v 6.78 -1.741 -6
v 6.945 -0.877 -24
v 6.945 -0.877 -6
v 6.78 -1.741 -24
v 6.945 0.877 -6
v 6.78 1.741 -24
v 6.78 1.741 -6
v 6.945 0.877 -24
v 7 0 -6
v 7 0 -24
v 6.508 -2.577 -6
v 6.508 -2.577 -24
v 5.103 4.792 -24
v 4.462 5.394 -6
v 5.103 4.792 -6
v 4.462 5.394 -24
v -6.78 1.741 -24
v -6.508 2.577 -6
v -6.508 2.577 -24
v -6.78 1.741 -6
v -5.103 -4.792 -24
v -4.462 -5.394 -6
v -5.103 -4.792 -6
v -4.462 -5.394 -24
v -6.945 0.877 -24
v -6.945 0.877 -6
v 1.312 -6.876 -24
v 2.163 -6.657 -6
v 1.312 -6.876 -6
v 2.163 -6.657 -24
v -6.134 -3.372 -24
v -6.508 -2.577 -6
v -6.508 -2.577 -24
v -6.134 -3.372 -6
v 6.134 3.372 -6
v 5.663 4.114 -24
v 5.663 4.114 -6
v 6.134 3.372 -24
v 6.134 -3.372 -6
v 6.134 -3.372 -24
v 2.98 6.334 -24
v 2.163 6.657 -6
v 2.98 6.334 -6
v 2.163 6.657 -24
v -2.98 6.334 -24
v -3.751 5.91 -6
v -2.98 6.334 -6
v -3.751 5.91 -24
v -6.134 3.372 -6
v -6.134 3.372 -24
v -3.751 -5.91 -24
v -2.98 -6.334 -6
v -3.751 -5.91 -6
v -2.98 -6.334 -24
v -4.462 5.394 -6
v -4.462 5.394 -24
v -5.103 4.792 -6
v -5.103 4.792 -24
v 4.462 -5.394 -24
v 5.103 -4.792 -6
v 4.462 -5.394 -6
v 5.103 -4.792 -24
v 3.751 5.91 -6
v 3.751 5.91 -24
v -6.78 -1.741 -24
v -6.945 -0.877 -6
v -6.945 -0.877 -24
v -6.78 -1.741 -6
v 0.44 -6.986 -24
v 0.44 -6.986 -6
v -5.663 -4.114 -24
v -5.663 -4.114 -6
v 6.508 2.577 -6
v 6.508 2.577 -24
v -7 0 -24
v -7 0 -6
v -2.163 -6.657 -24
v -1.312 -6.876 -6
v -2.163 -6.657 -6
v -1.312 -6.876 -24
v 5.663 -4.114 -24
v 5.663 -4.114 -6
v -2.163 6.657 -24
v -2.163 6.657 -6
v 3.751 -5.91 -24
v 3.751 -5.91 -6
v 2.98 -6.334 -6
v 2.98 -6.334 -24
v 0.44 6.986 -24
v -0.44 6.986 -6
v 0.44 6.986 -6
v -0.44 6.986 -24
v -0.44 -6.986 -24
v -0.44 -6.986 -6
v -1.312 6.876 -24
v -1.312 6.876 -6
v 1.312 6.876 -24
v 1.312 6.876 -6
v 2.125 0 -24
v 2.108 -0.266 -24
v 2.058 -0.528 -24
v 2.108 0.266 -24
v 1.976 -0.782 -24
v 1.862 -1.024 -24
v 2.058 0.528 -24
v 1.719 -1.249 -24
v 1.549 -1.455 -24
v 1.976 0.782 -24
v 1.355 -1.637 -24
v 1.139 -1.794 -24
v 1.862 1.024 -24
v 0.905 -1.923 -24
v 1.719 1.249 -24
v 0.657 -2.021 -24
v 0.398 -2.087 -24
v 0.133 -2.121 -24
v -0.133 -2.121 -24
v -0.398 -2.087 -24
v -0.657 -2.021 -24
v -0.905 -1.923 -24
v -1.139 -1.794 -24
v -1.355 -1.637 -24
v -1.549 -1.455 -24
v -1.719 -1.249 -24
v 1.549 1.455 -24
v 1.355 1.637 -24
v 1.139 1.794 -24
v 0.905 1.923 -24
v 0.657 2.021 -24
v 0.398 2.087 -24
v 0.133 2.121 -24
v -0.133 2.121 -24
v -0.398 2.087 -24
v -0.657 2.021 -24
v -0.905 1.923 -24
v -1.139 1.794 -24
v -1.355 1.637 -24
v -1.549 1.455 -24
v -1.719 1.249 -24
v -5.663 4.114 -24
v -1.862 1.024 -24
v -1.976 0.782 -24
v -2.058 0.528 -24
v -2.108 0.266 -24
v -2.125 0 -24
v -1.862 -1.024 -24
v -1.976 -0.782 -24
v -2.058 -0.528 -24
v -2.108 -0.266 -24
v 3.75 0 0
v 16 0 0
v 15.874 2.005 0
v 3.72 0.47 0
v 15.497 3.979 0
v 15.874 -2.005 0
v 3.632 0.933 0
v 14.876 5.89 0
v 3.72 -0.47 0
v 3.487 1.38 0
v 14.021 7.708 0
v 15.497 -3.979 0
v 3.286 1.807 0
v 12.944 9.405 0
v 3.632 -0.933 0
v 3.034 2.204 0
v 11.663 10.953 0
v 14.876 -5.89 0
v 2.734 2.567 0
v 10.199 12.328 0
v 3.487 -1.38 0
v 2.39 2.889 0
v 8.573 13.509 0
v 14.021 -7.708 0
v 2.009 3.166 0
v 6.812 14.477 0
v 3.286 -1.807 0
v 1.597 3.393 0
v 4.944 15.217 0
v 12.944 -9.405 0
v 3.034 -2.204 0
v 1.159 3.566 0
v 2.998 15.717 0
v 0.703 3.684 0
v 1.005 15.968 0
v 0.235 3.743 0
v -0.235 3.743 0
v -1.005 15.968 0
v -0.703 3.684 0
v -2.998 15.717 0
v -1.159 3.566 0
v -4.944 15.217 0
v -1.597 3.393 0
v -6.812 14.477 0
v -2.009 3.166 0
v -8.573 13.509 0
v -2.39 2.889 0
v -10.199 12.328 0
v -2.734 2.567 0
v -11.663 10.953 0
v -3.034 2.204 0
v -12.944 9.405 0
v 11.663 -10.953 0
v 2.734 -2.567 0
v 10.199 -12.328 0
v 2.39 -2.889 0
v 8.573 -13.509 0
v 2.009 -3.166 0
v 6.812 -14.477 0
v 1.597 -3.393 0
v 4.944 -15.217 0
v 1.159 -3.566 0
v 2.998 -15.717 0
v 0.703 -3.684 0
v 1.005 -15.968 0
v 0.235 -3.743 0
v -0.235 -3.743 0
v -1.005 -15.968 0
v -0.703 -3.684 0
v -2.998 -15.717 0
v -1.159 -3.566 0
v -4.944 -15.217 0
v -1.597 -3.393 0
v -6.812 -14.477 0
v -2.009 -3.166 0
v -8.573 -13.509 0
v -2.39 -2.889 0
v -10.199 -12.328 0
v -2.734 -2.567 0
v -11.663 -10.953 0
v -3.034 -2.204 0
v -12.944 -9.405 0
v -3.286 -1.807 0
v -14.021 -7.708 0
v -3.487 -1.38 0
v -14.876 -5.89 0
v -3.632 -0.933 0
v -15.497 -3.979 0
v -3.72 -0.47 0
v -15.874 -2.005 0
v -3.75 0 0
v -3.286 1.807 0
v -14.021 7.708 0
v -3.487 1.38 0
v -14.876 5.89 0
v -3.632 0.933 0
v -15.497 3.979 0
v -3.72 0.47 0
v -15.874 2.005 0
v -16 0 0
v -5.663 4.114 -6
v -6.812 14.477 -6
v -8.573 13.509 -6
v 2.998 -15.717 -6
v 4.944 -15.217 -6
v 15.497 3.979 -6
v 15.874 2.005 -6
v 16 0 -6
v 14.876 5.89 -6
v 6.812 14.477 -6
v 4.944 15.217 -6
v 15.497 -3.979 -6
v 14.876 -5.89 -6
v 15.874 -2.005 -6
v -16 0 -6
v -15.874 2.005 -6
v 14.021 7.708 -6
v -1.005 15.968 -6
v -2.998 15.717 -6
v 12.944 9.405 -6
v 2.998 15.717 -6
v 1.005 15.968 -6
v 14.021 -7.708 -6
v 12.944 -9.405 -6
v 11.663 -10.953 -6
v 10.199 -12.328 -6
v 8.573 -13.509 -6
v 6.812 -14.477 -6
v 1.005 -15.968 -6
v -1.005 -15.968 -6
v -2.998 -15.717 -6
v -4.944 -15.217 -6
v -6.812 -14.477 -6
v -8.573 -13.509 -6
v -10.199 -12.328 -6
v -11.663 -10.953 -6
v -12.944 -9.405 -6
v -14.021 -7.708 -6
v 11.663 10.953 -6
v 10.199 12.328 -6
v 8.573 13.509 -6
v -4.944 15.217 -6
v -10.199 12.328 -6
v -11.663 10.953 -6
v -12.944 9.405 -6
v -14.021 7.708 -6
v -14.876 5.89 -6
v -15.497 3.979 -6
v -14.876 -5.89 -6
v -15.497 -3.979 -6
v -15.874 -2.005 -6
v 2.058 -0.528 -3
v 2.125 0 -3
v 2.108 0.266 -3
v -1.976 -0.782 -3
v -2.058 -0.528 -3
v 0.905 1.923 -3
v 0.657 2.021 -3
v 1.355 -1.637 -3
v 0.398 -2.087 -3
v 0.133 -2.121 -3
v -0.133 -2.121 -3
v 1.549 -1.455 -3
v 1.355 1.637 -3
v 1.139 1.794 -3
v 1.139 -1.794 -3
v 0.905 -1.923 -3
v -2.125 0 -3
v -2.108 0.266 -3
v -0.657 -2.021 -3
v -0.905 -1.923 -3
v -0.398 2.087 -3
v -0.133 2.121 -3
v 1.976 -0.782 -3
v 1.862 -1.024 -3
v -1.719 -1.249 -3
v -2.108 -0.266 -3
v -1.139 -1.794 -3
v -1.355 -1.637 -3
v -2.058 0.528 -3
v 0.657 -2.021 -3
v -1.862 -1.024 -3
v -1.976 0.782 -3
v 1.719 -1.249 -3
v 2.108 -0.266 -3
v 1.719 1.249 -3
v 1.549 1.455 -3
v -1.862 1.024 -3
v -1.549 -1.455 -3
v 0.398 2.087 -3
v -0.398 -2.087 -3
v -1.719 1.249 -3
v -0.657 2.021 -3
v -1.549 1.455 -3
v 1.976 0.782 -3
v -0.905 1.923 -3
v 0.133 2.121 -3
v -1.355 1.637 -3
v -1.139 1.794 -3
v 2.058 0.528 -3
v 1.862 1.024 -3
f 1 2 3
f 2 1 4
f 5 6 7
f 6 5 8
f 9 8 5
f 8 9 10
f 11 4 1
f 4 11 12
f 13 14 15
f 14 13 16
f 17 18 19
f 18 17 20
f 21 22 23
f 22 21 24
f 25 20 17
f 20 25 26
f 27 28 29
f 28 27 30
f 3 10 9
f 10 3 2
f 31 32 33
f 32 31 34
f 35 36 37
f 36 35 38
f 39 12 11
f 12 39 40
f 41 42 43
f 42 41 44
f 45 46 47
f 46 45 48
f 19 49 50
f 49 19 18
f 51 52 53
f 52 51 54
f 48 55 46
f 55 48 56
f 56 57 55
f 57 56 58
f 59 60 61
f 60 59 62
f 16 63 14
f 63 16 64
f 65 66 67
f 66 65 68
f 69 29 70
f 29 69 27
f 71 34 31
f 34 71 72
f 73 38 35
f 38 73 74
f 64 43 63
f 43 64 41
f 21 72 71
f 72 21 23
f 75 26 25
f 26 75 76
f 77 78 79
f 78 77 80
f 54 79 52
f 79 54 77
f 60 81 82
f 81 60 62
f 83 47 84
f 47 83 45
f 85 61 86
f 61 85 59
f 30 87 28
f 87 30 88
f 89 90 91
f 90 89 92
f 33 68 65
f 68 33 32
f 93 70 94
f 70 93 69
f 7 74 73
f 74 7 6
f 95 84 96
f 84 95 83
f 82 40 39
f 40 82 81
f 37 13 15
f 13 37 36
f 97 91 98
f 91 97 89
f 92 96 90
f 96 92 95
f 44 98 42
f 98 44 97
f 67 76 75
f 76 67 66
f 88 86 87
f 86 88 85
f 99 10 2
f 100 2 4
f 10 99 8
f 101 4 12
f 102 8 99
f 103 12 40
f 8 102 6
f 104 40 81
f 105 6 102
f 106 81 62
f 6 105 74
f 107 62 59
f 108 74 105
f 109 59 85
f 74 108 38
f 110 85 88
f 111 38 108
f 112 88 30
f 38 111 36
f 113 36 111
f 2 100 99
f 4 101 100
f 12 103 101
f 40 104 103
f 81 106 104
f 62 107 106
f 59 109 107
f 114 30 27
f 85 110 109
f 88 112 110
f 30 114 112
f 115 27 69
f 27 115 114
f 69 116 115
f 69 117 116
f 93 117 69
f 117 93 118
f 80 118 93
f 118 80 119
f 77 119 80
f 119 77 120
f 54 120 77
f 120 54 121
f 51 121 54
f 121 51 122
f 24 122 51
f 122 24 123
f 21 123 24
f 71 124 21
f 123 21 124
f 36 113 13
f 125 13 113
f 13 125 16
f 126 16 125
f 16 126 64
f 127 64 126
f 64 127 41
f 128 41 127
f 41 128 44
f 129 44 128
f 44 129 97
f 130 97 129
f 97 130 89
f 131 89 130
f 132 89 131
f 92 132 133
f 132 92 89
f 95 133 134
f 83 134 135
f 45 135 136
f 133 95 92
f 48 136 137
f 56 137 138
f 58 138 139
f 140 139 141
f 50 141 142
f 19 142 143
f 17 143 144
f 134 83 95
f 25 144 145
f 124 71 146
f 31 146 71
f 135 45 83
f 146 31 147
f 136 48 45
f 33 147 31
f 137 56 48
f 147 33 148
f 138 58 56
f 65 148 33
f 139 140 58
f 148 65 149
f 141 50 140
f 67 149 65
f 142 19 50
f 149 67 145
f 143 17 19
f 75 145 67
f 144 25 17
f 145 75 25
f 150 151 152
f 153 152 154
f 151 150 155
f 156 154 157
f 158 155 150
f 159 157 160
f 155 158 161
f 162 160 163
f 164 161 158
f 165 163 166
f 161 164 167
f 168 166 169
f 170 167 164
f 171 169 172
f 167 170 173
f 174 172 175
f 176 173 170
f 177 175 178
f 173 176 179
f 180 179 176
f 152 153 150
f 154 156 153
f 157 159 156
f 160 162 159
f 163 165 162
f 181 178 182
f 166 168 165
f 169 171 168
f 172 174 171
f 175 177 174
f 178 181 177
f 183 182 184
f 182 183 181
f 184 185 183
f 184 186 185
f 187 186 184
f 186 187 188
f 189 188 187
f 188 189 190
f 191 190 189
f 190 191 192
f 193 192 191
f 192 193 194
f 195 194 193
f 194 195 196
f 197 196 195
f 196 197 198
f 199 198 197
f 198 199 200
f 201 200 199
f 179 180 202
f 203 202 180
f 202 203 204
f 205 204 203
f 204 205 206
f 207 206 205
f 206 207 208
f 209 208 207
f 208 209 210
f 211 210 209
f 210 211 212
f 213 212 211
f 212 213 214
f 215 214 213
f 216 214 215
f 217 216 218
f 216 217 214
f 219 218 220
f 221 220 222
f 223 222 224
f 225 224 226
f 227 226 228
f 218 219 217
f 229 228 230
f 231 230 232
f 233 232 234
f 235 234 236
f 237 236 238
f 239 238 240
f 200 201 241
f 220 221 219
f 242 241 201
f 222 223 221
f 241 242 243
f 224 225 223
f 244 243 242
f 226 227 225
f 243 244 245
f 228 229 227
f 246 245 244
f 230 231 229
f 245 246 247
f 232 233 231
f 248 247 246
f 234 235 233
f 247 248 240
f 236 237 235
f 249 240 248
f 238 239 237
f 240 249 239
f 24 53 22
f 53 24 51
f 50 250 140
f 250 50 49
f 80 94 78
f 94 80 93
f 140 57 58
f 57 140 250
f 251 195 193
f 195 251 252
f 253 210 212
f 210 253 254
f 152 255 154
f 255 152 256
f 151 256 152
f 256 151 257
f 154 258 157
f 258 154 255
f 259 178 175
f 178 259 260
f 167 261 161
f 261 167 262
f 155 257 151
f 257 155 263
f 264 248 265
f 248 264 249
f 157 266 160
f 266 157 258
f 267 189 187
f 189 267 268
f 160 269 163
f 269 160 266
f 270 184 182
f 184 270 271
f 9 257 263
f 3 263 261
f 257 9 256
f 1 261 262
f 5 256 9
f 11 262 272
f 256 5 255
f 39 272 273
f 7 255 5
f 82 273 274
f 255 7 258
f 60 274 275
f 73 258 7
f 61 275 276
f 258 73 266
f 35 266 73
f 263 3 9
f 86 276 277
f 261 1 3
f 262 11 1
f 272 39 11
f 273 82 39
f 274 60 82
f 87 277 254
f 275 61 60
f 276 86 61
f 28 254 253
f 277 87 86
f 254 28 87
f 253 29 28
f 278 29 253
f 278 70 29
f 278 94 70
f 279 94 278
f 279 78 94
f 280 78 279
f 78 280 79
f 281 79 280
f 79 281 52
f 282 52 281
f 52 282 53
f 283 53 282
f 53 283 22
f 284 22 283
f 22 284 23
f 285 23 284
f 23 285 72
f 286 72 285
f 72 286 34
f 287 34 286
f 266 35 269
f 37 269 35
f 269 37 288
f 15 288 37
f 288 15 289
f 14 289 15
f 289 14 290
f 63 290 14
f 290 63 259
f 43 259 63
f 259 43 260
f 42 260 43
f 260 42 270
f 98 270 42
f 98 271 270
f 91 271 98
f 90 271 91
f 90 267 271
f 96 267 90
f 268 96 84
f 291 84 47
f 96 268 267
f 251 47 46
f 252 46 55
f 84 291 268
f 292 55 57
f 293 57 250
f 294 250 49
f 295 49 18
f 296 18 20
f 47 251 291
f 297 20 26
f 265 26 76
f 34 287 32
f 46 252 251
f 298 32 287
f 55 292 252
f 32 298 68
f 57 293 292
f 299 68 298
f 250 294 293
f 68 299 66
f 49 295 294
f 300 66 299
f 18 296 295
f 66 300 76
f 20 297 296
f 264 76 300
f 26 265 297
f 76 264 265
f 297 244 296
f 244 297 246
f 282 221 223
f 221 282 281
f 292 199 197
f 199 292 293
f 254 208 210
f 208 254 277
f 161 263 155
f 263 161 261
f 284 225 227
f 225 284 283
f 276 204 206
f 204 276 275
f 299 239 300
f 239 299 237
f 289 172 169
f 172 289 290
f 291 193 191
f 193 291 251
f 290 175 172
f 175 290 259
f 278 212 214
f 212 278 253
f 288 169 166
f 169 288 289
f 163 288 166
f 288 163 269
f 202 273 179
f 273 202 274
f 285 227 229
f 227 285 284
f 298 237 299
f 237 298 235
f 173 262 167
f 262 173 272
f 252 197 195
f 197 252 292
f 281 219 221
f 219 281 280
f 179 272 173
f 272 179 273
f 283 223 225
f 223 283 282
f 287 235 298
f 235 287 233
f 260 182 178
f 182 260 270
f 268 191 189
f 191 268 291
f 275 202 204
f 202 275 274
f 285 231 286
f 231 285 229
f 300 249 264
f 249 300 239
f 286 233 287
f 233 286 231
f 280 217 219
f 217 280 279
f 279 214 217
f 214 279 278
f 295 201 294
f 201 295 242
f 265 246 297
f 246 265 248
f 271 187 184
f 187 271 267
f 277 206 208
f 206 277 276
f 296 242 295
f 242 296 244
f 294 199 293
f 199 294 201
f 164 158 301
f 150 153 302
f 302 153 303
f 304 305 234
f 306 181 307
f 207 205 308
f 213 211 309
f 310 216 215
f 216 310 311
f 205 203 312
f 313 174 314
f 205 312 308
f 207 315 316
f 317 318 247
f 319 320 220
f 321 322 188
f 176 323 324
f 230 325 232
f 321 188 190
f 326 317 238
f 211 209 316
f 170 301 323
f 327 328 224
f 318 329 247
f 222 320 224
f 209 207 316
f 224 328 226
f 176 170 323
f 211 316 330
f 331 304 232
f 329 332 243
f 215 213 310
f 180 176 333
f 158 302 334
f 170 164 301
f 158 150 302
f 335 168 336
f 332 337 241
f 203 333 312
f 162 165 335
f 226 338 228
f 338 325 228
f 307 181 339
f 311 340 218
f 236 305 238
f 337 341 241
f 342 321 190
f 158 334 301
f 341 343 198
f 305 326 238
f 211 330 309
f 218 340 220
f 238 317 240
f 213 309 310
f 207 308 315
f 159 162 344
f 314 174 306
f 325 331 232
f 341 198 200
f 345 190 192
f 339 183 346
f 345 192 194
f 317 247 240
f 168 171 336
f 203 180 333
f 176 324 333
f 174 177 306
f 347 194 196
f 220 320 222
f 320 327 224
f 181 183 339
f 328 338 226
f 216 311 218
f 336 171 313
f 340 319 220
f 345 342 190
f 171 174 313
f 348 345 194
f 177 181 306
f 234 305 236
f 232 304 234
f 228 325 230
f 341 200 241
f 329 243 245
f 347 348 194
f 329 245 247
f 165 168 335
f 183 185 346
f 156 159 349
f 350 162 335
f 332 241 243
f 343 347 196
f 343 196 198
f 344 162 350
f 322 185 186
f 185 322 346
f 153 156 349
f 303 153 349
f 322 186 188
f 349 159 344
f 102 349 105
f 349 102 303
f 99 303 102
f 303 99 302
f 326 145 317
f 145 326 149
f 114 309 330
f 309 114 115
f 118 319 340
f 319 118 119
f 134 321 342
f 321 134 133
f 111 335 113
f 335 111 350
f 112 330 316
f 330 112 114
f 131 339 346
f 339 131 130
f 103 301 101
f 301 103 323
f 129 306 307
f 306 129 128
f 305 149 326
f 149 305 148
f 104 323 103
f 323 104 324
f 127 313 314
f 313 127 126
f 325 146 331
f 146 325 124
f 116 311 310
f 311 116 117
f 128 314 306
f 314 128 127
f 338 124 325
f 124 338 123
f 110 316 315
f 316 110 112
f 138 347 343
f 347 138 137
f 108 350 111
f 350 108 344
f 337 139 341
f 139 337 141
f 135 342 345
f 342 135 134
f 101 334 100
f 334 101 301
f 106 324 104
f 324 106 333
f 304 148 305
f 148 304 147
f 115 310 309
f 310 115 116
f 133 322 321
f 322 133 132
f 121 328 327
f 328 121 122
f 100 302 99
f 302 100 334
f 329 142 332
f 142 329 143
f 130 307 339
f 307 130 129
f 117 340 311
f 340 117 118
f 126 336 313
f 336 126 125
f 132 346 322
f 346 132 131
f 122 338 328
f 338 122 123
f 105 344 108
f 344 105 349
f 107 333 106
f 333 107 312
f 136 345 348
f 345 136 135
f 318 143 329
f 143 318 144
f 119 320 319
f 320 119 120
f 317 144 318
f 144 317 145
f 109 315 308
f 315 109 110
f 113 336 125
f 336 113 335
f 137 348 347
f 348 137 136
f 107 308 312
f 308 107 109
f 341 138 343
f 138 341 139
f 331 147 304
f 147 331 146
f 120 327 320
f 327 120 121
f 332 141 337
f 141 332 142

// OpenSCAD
$fn = 50;


difference() {
	union() {
		translate(v = [0, 0, -24.0000000000]) {
			cylinder(h = 24, r = 7.0000000000);
		}
		translate(v = [0, 0, -6.0000000000]) {
			cylinder(h = 6, r = 16.0000000000);
		}
	}
	union() {
		translate(v = [0, 0, 0]) {
			rotate(a = [0, 0, 0]) {
				difference() {
					union() {
						#translate(v = [0, 0, -24.0000000000]) {
							cylinder(h = 24, r = 2.0000000000);
						}
						#translate(v = [0, 0, -3]) {
							cylinder(h = 3, r1 = 2.1250000000, r2 = 3.7500000000);
						}
						#translate(v = [0, 0, -24.0000000000]) {
							cylinder(h = 24, r = 2.1250000000);
						}
						#translate(v = [0, 0, -24.0000000000]) {
							cylinder(h = 24, r = 2.0000000000);
						}
					}
					union();
				}
			}
		}
	}
}
